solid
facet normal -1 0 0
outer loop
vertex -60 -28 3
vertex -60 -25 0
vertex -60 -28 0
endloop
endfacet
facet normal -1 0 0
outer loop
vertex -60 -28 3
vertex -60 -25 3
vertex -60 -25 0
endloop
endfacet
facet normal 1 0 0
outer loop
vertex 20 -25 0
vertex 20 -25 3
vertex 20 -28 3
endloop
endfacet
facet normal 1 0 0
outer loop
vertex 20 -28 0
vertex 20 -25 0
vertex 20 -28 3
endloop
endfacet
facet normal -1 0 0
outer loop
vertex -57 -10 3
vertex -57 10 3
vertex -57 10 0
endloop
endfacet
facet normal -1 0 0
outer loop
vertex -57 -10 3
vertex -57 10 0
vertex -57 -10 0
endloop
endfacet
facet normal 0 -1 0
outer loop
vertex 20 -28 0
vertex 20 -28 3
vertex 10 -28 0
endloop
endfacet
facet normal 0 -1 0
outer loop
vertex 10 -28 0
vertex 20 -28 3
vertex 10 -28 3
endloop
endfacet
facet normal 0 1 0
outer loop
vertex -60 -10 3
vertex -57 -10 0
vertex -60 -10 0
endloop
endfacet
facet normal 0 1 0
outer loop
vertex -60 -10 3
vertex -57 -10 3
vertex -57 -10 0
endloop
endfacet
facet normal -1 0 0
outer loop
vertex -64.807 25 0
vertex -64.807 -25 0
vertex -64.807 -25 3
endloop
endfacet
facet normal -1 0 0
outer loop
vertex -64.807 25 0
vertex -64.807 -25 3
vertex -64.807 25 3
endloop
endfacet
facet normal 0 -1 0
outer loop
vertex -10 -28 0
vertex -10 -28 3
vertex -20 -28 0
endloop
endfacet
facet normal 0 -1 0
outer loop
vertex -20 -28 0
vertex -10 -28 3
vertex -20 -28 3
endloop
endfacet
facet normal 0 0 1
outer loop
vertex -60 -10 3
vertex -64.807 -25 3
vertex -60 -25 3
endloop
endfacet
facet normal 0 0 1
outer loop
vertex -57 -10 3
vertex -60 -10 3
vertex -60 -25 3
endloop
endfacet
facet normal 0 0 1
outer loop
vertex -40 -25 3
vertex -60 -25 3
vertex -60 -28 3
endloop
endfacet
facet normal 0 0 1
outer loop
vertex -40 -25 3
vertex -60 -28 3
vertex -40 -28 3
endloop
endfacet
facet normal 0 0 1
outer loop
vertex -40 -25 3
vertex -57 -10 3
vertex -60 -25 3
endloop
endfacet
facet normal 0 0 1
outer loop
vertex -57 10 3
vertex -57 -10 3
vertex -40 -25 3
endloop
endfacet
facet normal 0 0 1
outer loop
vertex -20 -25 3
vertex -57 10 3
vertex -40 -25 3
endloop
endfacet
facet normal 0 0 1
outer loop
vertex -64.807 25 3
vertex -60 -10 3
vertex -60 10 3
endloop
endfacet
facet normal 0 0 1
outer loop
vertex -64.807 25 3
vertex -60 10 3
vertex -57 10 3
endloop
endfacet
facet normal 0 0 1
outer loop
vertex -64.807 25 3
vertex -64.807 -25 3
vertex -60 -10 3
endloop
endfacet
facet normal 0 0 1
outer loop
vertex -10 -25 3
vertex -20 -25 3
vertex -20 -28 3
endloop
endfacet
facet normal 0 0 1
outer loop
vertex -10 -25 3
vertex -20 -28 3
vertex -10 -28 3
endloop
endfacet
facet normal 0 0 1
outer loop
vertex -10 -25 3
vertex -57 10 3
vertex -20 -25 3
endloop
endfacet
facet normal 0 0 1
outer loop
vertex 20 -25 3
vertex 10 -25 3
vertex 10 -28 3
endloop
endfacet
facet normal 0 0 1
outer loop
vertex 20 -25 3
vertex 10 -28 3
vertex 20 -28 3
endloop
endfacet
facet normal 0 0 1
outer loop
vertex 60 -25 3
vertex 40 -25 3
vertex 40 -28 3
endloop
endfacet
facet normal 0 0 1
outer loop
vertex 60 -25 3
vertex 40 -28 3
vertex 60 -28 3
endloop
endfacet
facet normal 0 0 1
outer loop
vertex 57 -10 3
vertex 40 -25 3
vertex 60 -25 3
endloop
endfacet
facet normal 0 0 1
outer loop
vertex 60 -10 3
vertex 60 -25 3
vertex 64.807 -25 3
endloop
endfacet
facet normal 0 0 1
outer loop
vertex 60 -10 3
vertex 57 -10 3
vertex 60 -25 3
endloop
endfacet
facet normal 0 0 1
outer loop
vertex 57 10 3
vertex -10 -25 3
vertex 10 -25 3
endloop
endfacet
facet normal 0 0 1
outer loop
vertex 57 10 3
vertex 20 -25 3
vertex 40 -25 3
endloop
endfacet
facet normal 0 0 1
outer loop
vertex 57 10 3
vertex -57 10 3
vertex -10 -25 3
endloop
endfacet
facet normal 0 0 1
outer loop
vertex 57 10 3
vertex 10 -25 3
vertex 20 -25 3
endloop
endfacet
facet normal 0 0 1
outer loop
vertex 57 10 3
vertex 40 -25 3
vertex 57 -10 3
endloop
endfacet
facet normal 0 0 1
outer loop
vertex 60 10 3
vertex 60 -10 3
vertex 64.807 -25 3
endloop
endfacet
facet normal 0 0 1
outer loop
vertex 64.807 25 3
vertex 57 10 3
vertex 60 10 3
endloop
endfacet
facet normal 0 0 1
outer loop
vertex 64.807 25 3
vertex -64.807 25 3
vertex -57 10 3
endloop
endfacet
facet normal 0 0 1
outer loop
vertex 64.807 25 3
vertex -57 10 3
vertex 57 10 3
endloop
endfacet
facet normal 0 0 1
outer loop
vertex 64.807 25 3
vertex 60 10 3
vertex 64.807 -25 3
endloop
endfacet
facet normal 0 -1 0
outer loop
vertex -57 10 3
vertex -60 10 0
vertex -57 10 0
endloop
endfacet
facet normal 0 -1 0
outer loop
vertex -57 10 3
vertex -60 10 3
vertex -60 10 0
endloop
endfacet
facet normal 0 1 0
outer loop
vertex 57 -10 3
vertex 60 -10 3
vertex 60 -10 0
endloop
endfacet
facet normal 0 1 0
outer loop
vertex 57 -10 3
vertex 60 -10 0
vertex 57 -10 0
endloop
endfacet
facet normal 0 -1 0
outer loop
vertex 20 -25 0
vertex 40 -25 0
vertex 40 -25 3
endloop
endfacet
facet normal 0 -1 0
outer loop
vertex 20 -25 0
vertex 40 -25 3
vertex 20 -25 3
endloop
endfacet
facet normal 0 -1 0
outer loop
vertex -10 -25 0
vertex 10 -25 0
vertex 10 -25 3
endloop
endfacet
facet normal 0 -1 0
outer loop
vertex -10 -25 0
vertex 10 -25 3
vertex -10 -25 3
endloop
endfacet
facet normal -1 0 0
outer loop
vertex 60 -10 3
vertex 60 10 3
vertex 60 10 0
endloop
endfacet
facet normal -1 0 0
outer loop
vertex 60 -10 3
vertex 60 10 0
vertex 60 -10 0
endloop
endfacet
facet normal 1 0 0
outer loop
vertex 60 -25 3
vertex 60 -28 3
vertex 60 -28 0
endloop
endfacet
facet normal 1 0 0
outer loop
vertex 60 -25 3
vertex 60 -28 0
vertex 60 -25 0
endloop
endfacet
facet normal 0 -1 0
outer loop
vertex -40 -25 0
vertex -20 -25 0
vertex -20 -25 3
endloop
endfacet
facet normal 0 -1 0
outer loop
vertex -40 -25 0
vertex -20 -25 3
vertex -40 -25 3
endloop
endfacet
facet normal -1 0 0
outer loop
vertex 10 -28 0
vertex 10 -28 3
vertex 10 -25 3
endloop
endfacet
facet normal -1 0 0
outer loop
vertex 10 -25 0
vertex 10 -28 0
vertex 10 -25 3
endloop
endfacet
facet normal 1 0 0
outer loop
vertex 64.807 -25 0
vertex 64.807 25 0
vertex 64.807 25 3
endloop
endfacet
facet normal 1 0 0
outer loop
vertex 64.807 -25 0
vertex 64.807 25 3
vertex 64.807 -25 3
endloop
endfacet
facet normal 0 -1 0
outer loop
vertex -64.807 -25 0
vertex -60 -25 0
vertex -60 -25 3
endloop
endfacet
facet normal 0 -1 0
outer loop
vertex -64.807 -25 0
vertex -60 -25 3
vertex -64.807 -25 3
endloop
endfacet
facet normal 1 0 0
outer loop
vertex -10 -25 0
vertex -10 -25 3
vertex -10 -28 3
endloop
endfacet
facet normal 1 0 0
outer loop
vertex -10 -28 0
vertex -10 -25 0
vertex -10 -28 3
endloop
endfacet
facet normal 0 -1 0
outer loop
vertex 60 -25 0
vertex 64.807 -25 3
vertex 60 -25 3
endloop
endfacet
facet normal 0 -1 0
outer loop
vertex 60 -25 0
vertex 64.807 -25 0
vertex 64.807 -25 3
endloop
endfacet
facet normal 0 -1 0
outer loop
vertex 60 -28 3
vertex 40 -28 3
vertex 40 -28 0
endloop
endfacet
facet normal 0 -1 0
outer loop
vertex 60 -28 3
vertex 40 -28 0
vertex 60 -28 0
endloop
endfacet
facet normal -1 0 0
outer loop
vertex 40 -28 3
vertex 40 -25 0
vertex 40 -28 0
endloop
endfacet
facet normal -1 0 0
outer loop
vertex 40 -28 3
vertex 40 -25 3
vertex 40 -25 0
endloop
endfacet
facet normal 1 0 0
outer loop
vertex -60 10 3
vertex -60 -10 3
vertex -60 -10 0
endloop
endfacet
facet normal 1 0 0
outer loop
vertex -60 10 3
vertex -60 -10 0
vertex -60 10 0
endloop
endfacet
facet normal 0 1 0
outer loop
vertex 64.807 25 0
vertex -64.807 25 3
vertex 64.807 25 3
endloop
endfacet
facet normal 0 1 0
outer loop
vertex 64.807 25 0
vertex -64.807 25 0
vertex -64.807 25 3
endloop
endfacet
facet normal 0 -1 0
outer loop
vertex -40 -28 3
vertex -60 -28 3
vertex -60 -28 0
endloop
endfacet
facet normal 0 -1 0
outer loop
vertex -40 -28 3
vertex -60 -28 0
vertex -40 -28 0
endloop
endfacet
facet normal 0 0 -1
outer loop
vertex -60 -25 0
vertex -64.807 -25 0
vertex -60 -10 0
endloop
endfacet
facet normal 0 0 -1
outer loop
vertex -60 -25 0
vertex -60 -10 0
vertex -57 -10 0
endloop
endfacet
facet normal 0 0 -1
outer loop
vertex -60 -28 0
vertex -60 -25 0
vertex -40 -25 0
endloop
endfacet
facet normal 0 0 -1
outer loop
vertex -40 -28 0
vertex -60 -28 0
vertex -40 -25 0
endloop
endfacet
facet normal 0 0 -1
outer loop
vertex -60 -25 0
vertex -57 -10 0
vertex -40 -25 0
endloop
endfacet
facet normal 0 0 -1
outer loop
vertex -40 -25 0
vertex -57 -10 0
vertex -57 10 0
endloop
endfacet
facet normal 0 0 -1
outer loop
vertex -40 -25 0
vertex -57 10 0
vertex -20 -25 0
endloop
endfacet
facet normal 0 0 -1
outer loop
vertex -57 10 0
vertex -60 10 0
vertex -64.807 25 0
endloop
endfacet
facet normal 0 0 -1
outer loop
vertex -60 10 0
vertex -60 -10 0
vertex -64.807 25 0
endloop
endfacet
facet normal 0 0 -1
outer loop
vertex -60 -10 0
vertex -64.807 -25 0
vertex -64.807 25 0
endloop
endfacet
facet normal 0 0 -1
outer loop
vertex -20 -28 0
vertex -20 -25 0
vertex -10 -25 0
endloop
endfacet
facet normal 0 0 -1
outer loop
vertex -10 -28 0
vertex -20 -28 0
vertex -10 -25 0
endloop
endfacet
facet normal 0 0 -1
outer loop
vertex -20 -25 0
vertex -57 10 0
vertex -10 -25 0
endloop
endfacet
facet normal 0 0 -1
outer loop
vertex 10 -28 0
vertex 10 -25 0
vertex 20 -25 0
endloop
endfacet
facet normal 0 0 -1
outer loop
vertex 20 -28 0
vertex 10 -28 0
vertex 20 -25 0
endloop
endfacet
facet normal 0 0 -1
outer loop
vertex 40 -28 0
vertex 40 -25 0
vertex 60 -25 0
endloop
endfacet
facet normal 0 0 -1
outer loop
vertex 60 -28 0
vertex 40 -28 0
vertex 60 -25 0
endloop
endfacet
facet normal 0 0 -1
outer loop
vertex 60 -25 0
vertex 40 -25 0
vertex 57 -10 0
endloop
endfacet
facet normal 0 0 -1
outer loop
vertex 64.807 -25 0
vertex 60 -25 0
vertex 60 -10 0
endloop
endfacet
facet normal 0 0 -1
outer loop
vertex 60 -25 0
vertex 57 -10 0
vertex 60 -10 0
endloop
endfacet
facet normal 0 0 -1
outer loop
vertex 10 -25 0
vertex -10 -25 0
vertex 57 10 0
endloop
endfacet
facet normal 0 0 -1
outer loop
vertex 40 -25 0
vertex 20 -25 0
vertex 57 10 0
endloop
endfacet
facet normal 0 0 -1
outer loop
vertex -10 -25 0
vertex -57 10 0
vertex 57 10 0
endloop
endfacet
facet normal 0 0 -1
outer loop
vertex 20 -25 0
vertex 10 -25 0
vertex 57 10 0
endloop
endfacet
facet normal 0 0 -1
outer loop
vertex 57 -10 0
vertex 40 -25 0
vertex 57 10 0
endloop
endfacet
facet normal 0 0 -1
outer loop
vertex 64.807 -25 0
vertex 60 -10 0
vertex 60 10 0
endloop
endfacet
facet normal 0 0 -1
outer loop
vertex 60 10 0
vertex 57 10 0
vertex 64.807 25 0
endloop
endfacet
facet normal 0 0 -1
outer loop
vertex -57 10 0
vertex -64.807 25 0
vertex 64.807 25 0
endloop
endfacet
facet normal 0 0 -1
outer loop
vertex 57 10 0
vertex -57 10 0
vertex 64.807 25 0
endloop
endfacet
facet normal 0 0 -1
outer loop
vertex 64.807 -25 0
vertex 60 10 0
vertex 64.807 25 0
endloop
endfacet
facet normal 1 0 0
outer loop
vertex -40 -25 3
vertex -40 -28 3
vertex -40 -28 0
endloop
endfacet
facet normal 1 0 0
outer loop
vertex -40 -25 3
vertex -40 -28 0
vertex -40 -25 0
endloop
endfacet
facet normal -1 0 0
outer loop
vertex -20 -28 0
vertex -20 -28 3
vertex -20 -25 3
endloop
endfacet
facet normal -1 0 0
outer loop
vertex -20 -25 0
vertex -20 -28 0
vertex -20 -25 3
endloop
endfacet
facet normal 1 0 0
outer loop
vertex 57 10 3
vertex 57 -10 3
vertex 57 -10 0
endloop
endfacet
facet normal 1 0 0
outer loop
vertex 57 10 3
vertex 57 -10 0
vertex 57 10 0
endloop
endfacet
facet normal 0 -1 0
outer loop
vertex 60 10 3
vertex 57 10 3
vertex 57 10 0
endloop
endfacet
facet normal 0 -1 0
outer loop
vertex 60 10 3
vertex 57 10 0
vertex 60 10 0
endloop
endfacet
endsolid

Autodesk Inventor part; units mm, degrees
ref_plane "YZ Plane" through (0, 0, 0) normal (1, 0, 0) x (0, 1, 0)
ref_plane "XZ Plane" through (0, 0, 0) normal (0, 1, 0) x (-1, 0, 0)
ref_plane "XY Plane" through (0, 0, 0) normal (0, 0, 1) x (1, 0, 0)
sketch "Sketch1" plane through (0, 0, 0) normal (0, 0, 1) x (1, 0, 0)
  circle A0 centre (0, 0) radius 85 construction
  line L0 (-64.8074, 55) -> (64.8074, 55) construction
  line L1 (64.8074, -25) -> (-64.8074, -25)
  line L2 (-64.8074, -25) -> (-64.8074, 25)
  line L3 (-64.8074, 25) -> (64.8074, 25)
  line L4 (64.8074, 25) -> (64.8074, -25)
  line L5 (64.8074, -25) -> (-64.8074, 25) construction
  line L6 (-64.8074, -25) -> (64.8074, 25) construction
  dimension "d0" = 170
  dimension "d1" = 55
  dimension "d2" = 129.6148
  dimension "d3" = 50
extrude "Extrusion1" add sketch "Sketch1" along normal blind 3
sketch "Sketch2" plane through (0, 0, 3) normal (0, 0, 1) x (1, 0, 0)
  line L0 (-64.8074, -25) -> (64.8074, -25) projected
  line L1 (-40, -25) -> (-60, -25)
  line L2 (-60, -25) -> (-60, -28)
  line L3 (-60, -28) -> (-40, -28)
  line L4 (-40, -28) -> (-40, -25)
  line L5 (-20, -25) -> (-10, -25)
  line L6 (-10, -25) -> (-10, -28)
  line L7 (-10, -28) -> (-20, -28)
  line L8 (-20, -28) -> (-20, -25)
  point P0 (0, 0)
  dimension "d6" = 20
  dimension "d7" = 3
  dimension "d8" = 10
  dimension "d9" = 3
  dimension "d10" = 10
  dimension "d11" = 20
extrude "Extrusion2" add sketch "Sketch2" against normal blind 3
sketch "Sketch3" plane through (0, 0, 3) normal (0, 0, 1) x (1, 0, 0)
  line L0 (-60, 10) -> (-57, 10)
  line L1 (-57, 10) -> (-57, -10)
  line L2 (-57, -10) -> (-60, -10)
  line L3 (-60, -10) -> (-60, 10)
  point P0 (0, 0)
  point P1 (-60, 0)
  dimension "d14" = 3
  dimension "d15" = 20
  dimension "d16" = 57
extrude "Extrusion3" cut sketch "Sketch3" against normal blind 3
mirror "Mirror1" about plane through (0, 0, 0) normal (1, 0, 0) of "Extrusion2", "Extrusion3"
properties part number "Frount plate"
